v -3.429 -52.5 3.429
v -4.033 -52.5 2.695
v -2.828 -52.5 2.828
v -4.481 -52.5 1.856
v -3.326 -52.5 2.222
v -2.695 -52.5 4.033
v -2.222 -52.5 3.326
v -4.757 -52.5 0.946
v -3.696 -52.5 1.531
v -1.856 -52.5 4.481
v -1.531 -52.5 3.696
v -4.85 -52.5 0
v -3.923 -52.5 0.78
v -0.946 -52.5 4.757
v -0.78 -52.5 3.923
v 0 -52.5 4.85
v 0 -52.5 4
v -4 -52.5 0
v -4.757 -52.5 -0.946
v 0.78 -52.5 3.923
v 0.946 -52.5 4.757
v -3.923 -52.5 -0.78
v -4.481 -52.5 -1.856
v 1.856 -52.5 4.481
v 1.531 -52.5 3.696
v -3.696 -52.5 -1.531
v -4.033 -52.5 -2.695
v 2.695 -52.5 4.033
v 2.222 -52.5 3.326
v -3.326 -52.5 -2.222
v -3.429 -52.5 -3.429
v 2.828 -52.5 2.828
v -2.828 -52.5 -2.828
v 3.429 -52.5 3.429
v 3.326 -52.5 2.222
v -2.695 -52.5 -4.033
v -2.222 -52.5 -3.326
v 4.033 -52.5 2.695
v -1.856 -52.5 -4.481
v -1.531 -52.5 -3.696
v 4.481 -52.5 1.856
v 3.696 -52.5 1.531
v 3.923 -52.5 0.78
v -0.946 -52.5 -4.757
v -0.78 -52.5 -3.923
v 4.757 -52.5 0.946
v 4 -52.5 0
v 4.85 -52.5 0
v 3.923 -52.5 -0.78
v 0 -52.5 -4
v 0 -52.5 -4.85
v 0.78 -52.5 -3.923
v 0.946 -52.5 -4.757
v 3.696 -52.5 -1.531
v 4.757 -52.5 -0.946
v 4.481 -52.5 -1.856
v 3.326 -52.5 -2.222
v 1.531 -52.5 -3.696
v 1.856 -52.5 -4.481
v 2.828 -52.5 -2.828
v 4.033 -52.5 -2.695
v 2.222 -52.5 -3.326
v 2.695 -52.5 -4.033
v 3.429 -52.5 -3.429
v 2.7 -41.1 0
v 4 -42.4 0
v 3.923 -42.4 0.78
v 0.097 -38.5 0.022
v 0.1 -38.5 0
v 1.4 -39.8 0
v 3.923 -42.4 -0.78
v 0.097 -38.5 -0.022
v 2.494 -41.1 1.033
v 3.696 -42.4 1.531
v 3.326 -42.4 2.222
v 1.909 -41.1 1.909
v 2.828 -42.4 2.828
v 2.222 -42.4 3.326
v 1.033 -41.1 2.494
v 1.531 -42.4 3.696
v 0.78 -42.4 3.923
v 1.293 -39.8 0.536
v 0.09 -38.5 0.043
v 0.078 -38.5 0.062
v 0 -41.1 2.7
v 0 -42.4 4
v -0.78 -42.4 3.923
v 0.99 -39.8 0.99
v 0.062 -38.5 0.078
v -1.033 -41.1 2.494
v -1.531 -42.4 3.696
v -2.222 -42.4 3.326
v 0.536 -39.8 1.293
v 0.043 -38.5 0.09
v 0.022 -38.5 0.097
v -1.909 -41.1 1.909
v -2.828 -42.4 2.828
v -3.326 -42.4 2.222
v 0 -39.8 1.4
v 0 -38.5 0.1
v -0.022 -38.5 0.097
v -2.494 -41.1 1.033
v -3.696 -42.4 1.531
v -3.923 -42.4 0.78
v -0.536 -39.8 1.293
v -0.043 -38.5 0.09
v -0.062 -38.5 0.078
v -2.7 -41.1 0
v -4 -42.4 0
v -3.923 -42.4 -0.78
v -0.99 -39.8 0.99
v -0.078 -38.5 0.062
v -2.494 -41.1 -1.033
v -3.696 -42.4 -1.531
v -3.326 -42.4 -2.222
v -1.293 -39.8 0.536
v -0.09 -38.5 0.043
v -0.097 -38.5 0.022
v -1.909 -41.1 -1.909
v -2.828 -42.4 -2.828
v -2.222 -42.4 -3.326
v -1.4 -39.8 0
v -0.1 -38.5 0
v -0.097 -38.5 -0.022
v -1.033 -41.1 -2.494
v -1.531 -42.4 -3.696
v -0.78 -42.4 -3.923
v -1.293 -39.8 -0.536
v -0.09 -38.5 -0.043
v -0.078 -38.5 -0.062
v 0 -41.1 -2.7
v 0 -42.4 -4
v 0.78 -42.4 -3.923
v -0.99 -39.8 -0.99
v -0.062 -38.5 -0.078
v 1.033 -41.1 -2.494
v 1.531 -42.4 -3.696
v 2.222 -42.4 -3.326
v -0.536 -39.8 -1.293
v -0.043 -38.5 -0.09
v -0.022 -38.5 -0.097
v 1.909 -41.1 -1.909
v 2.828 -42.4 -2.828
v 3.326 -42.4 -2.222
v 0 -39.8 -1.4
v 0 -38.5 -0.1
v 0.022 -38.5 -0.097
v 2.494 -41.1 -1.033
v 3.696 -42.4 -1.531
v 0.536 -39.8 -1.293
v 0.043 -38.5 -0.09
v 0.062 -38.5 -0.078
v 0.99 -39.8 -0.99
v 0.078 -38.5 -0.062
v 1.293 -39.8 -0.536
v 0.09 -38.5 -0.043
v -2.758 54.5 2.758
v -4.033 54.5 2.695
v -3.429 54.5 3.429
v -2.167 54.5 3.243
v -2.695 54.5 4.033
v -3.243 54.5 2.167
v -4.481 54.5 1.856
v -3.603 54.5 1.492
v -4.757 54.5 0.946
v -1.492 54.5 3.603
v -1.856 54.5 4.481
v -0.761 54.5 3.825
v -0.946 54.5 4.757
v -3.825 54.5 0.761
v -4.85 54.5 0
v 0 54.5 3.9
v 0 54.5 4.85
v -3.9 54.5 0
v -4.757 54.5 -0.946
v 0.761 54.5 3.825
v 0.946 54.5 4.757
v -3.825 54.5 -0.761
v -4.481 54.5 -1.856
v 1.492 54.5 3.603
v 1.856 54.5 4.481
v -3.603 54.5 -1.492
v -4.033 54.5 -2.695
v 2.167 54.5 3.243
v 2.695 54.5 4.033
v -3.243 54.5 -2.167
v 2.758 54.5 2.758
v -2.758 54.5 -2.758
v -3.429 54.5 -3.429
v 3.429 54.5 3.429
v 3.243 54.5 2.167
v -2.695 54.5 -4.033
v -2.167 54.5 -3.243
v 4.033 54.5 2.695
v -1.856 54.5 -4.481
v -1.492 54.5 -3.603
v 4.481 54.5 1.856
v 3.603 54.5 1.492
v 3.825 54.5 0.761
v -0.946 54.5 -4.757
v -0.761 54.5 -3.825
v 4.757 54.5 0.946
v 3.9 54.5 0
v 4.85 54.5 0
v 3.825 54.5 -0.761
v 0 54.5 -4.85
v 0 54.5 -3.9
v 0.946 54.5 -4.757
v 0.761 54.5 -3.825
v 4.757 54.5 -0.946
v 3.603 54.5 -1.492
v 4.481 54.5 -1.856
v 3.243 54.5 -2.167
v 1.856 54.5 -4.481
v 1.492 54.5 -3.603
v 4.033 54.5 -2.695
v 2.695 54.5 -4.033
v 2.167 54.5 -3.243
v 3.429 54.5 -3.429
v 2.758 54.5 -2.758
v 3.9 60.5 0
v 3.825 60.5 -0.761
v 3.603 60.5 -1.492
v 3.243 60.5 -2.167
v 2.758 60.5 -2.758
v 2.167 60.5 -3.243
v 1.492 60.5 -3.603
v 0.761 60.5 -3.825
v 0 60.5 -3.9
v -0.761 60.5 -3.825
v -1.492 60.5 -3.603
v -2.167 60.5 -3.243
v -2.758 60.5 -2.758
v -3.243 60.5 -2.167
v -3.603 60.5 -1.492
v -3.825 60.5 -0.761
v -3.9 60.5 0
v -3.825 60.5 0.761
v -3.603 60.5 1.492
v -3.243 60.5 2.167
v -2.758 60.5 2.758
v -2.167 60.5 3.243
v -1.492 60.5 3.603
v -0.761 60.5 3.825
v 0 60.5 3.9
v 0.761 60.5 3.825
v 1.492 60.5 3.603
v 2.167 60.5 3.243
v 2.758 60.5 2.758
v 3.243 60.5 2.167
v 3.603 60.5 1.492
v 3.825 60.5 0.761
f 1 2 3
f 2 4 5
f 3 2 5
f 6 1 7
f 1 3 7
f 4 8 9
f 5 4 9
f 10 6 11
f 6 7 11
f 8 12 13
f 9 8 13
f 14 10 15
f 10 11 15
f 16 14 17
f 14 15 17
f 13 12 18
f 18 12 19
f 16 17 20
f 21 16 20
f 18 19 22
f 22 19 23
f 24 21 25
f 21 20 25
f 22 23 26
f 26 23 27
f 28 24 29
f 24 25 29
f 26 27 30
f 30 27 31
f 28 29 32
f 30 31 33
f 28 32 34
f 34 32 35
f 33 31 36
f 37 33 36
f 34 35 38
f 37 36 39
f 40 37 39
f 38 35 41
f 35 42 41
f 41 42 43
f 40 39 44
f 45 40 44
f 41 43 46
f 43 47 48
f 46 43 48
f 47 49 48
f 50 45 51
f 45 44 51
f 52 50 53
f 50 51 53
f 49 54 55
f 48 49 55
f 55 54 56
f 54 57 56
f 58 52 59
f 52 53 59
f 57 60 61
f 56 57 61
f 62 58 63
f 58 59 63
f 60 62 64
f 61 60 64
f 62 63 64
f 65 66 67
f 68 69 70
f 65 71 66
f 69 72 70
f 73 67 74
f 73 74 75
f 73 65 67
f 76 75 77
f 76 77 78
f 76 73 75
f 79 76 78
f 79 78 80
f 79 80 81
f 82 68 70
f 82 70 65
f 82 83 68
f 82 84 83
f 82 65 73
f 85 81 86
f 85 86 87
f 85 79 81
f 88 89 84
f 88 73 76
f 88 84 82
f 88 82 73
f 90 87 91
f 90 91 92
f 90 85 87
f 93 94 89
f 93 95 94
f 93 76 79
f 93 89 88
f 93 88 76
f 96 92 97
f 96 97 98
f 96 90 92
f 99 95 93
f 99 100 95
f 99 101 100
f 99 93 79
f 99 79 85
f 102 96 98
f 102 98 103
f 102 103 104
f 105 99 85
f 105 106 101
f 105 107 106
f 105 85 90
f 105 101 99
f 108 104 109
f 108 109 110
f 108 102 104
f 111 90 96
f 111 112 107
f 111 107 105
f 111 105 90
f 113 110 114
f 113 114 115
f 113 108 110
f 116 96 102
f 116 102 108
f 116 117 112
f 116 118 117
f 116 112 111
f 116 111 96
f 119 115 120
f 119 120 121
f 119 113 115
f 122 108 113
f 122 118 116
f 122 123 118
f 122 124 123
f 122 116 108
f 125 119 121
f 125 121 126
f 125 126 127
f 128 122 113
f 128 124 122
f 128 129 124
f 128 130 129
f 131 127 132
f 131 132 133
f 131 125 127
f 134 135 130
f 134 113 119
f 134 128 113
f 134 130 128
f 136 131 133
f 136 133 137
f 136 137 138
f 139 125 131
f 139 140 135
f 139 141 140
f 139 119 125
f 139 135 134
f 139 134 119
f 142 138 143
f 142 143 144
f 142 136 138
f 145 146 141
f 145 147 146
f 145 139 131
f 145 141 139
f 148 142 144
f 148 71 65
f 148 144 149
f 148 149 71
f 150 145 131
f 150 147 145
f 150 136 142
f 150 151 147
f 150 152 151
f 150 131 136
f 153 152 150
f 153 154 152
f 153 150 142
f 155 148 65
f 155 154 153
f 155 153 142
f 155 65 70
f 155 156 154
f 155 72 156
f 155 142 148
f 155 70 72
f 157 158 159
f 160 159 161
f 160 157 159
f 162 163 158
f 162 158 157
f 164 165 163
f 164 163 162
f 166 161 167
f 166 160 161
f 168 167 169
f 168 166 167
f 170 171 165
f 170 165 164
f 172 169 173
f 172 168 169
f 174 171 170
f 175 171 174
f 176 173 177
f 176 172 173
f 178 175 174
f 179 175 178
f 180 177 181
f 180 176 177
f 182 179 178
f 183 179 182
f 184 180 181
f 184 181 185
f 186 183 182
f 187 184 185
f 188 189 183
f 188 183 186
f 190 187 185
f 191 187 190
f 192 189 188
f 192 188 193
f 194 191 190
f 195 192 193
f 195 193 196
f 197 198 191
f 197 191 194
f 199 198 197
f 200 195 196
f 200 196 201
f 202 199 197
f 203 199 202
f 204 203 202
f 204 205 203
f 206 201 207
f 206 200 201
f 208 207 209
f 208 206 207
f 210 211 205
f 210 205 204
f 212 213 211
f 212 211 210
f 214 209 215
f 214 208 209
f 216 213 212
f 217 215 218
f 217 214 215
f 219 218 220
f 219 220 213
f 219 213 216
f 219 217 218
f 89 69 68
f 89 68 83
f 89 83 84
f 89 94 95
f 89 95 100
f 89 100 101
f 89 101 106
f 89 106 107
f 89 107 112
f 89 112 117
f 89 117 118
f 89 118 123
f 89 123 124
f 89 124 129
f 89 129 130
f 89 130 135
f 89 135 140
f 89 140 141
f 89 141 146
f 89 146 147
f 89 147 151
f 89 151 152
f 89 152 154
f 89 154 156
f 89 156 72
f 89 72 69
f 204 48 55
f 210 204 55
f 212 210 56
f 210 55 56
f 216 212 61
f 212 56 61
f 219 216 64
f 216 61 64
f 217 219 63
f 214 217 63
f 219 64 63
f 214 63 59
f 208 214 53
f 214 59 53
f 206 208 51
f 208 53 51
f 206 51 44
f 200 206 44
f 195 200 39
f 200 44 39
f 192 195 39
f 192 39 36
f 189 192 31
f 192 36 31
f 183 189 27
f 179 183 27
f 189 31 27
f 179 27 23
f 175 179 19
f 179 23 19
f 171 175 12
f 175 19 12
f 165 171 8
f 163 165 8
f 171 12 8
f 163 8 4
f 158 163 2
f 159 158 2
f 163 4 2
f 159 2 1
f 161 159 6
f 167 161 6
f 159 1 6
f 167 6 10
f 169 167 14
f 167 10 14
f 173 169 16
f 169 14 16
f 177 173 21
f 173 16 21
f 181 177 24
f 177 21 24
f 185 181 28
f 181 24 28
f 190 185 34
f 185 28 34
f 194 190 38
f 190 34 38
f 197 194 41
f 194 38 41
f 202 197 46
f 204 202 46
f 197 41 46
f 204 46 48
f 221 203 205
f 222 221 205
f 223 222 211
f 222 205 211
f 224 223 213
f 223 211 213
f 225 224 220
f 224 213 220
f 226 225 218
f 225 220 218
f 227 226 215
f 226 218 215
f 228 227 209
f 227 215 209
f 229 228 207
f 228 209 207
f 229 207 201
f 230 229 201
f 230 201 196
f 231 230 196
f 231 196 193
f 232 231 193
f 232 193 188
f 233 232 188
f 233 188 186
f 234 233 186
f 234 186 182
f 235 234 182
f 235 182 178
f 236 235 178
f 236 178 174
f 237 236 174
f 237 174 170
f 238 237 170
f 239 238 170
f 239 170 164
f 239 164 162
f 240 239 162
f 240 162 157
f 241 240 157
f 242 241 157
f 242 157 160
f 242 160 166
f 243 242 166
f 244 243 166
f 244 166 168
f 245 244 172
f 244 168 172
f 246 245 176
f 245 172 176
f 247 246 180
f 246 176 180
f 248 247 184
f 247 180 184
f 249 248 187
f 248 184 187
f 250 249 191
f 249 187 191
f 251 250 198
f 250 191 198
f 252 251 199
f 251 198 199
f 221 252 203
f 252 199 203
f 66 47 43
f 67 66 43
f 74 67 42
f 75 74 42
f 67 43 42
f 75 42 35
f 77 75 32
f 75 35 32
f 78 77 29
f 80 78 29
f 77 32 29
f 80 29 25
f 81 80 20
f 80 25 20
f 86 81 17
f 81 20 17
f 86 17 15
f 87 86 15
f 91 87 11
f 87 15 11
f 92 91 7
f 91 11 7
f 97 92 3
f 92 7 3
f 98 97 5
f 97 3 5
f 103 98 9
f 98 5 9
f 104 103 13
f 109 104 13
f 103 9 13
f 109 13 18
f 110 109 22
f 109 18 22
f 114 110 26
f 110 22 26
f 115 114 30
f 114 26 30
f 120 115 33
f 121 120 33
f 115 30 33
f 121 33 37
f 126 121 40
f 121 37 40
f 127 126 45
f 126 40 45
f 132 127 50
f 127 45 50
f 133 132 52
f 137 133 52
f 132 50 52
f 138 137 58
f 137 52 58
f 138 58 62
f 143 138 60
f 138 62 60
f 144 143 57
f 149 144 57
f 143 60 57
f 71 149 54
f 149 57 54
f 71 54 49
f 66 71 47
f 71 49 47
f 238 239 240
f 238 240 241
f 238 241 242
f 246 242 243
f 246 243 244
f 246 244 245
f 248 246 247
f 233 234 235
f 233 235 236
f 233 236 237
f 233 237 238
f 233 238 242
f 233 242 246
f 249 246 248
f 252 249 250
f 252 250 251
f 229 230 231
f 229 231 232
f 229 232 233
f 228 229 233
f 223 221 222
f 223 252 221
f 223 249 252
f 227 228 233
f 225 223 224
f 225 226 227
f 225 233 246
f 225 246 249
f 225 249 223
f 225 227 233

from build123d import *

# Parameters (mm, degrees)
SKETCH1_R           = 4.85
SKETCH1_R_2         = 4
BOSS_EXTRUDE1_DEPTH = 52.5
SKETCH2_R           = 3.9
BOSS_EXTRUDE2_DEPTH = 8
SKETCH3_R           = 4.85
BOSS_EXTRUDE3_DEPTH = 2
CHAMFER1_SIZE       = 4
SKETCH4_R           = 4.85
BOSS_EXTRUDE4_DEPTH = 107
SKETCH5_R           = 4
CUT_EXTRUDE1_DEPTH  = 14
CHAMFER2_SIZE       = 3.9


with BuildPart() as part:
    # Sketch1 → Boss-Extrude1 (new body, symmetric)
    with BuildSketch(Plane(origin=(0, 0, 0), x_dir=(1, 0, 0), z_dir=(0, 1, 0))):
        Circle(SKETCH1_R)
        Circle(SKETCH1_R_2, mode=Mode.SUBTRACT)
    extrude(amount=BOSS_EXTRUDE1_DEPTH, both=True)



with BuildPart() as body_2:
    # Sketch2 → Boss-Extrude2 (new body)
    with BuildSketch(Plane(origin=(0, 52.5, 0), x_dir=(1, 0, 0), z_dir=(0, 1, 0))):
        Circle(SKETCH2_R)
    extrude(amount=BOSS_EXTRUDE2_DEPTH)


with BuildPart() as part_1:
    add(part.part)

    add(body_2.part)  # Boss-Extrude3 merges body 2
    # Sketch3 → Boss-Extrude3 (add)
    with BuildSketch(Plane(origin=(0, 52.5, 0), x_dir=(1, 0, 0), z_dir=(0, 1, 0))):
        Circle(SKETCH3_R)
    extrude(amount=BOSS_EXTRUDE3_DEPTH)

    # Chamfer1
    chamfer1_edges = [part_1.edges().sort_by_distance(p)[0] for p in [
        (-4, 52.5, 0),
    ]]
    chamfer(chamfer1_edges, length=CHAMFER1_SIZE)

    # Sketch4 → Boss-Extrude4 (add)
    with BuildSketch(Plane.XZ.offset(52.5)):
        Circle(SKETCH4_R)
    extrude(amount=-BOSS_EXTRUDE4_DEPTH)

    # Sketch5 → Cut-Extrude1 (cut)
    with BuildSketch(Plane.XZ.offset(52.5)):
        Circle(SKETCH5_R)
    extrude(amount=-CUT_EXTRUDE1_DEPTH, mode=Mode.SUBTRACT)

    # Chamfer2
    chamfer2_edges = [part_1.edges().sort_by_distance(p)[0] for p in [
        (-4, -38.5, 0),
    ]]
    chamfer(chamfer2_edges, length=CHAMFER2_SIZE)


solid = part_1.part
